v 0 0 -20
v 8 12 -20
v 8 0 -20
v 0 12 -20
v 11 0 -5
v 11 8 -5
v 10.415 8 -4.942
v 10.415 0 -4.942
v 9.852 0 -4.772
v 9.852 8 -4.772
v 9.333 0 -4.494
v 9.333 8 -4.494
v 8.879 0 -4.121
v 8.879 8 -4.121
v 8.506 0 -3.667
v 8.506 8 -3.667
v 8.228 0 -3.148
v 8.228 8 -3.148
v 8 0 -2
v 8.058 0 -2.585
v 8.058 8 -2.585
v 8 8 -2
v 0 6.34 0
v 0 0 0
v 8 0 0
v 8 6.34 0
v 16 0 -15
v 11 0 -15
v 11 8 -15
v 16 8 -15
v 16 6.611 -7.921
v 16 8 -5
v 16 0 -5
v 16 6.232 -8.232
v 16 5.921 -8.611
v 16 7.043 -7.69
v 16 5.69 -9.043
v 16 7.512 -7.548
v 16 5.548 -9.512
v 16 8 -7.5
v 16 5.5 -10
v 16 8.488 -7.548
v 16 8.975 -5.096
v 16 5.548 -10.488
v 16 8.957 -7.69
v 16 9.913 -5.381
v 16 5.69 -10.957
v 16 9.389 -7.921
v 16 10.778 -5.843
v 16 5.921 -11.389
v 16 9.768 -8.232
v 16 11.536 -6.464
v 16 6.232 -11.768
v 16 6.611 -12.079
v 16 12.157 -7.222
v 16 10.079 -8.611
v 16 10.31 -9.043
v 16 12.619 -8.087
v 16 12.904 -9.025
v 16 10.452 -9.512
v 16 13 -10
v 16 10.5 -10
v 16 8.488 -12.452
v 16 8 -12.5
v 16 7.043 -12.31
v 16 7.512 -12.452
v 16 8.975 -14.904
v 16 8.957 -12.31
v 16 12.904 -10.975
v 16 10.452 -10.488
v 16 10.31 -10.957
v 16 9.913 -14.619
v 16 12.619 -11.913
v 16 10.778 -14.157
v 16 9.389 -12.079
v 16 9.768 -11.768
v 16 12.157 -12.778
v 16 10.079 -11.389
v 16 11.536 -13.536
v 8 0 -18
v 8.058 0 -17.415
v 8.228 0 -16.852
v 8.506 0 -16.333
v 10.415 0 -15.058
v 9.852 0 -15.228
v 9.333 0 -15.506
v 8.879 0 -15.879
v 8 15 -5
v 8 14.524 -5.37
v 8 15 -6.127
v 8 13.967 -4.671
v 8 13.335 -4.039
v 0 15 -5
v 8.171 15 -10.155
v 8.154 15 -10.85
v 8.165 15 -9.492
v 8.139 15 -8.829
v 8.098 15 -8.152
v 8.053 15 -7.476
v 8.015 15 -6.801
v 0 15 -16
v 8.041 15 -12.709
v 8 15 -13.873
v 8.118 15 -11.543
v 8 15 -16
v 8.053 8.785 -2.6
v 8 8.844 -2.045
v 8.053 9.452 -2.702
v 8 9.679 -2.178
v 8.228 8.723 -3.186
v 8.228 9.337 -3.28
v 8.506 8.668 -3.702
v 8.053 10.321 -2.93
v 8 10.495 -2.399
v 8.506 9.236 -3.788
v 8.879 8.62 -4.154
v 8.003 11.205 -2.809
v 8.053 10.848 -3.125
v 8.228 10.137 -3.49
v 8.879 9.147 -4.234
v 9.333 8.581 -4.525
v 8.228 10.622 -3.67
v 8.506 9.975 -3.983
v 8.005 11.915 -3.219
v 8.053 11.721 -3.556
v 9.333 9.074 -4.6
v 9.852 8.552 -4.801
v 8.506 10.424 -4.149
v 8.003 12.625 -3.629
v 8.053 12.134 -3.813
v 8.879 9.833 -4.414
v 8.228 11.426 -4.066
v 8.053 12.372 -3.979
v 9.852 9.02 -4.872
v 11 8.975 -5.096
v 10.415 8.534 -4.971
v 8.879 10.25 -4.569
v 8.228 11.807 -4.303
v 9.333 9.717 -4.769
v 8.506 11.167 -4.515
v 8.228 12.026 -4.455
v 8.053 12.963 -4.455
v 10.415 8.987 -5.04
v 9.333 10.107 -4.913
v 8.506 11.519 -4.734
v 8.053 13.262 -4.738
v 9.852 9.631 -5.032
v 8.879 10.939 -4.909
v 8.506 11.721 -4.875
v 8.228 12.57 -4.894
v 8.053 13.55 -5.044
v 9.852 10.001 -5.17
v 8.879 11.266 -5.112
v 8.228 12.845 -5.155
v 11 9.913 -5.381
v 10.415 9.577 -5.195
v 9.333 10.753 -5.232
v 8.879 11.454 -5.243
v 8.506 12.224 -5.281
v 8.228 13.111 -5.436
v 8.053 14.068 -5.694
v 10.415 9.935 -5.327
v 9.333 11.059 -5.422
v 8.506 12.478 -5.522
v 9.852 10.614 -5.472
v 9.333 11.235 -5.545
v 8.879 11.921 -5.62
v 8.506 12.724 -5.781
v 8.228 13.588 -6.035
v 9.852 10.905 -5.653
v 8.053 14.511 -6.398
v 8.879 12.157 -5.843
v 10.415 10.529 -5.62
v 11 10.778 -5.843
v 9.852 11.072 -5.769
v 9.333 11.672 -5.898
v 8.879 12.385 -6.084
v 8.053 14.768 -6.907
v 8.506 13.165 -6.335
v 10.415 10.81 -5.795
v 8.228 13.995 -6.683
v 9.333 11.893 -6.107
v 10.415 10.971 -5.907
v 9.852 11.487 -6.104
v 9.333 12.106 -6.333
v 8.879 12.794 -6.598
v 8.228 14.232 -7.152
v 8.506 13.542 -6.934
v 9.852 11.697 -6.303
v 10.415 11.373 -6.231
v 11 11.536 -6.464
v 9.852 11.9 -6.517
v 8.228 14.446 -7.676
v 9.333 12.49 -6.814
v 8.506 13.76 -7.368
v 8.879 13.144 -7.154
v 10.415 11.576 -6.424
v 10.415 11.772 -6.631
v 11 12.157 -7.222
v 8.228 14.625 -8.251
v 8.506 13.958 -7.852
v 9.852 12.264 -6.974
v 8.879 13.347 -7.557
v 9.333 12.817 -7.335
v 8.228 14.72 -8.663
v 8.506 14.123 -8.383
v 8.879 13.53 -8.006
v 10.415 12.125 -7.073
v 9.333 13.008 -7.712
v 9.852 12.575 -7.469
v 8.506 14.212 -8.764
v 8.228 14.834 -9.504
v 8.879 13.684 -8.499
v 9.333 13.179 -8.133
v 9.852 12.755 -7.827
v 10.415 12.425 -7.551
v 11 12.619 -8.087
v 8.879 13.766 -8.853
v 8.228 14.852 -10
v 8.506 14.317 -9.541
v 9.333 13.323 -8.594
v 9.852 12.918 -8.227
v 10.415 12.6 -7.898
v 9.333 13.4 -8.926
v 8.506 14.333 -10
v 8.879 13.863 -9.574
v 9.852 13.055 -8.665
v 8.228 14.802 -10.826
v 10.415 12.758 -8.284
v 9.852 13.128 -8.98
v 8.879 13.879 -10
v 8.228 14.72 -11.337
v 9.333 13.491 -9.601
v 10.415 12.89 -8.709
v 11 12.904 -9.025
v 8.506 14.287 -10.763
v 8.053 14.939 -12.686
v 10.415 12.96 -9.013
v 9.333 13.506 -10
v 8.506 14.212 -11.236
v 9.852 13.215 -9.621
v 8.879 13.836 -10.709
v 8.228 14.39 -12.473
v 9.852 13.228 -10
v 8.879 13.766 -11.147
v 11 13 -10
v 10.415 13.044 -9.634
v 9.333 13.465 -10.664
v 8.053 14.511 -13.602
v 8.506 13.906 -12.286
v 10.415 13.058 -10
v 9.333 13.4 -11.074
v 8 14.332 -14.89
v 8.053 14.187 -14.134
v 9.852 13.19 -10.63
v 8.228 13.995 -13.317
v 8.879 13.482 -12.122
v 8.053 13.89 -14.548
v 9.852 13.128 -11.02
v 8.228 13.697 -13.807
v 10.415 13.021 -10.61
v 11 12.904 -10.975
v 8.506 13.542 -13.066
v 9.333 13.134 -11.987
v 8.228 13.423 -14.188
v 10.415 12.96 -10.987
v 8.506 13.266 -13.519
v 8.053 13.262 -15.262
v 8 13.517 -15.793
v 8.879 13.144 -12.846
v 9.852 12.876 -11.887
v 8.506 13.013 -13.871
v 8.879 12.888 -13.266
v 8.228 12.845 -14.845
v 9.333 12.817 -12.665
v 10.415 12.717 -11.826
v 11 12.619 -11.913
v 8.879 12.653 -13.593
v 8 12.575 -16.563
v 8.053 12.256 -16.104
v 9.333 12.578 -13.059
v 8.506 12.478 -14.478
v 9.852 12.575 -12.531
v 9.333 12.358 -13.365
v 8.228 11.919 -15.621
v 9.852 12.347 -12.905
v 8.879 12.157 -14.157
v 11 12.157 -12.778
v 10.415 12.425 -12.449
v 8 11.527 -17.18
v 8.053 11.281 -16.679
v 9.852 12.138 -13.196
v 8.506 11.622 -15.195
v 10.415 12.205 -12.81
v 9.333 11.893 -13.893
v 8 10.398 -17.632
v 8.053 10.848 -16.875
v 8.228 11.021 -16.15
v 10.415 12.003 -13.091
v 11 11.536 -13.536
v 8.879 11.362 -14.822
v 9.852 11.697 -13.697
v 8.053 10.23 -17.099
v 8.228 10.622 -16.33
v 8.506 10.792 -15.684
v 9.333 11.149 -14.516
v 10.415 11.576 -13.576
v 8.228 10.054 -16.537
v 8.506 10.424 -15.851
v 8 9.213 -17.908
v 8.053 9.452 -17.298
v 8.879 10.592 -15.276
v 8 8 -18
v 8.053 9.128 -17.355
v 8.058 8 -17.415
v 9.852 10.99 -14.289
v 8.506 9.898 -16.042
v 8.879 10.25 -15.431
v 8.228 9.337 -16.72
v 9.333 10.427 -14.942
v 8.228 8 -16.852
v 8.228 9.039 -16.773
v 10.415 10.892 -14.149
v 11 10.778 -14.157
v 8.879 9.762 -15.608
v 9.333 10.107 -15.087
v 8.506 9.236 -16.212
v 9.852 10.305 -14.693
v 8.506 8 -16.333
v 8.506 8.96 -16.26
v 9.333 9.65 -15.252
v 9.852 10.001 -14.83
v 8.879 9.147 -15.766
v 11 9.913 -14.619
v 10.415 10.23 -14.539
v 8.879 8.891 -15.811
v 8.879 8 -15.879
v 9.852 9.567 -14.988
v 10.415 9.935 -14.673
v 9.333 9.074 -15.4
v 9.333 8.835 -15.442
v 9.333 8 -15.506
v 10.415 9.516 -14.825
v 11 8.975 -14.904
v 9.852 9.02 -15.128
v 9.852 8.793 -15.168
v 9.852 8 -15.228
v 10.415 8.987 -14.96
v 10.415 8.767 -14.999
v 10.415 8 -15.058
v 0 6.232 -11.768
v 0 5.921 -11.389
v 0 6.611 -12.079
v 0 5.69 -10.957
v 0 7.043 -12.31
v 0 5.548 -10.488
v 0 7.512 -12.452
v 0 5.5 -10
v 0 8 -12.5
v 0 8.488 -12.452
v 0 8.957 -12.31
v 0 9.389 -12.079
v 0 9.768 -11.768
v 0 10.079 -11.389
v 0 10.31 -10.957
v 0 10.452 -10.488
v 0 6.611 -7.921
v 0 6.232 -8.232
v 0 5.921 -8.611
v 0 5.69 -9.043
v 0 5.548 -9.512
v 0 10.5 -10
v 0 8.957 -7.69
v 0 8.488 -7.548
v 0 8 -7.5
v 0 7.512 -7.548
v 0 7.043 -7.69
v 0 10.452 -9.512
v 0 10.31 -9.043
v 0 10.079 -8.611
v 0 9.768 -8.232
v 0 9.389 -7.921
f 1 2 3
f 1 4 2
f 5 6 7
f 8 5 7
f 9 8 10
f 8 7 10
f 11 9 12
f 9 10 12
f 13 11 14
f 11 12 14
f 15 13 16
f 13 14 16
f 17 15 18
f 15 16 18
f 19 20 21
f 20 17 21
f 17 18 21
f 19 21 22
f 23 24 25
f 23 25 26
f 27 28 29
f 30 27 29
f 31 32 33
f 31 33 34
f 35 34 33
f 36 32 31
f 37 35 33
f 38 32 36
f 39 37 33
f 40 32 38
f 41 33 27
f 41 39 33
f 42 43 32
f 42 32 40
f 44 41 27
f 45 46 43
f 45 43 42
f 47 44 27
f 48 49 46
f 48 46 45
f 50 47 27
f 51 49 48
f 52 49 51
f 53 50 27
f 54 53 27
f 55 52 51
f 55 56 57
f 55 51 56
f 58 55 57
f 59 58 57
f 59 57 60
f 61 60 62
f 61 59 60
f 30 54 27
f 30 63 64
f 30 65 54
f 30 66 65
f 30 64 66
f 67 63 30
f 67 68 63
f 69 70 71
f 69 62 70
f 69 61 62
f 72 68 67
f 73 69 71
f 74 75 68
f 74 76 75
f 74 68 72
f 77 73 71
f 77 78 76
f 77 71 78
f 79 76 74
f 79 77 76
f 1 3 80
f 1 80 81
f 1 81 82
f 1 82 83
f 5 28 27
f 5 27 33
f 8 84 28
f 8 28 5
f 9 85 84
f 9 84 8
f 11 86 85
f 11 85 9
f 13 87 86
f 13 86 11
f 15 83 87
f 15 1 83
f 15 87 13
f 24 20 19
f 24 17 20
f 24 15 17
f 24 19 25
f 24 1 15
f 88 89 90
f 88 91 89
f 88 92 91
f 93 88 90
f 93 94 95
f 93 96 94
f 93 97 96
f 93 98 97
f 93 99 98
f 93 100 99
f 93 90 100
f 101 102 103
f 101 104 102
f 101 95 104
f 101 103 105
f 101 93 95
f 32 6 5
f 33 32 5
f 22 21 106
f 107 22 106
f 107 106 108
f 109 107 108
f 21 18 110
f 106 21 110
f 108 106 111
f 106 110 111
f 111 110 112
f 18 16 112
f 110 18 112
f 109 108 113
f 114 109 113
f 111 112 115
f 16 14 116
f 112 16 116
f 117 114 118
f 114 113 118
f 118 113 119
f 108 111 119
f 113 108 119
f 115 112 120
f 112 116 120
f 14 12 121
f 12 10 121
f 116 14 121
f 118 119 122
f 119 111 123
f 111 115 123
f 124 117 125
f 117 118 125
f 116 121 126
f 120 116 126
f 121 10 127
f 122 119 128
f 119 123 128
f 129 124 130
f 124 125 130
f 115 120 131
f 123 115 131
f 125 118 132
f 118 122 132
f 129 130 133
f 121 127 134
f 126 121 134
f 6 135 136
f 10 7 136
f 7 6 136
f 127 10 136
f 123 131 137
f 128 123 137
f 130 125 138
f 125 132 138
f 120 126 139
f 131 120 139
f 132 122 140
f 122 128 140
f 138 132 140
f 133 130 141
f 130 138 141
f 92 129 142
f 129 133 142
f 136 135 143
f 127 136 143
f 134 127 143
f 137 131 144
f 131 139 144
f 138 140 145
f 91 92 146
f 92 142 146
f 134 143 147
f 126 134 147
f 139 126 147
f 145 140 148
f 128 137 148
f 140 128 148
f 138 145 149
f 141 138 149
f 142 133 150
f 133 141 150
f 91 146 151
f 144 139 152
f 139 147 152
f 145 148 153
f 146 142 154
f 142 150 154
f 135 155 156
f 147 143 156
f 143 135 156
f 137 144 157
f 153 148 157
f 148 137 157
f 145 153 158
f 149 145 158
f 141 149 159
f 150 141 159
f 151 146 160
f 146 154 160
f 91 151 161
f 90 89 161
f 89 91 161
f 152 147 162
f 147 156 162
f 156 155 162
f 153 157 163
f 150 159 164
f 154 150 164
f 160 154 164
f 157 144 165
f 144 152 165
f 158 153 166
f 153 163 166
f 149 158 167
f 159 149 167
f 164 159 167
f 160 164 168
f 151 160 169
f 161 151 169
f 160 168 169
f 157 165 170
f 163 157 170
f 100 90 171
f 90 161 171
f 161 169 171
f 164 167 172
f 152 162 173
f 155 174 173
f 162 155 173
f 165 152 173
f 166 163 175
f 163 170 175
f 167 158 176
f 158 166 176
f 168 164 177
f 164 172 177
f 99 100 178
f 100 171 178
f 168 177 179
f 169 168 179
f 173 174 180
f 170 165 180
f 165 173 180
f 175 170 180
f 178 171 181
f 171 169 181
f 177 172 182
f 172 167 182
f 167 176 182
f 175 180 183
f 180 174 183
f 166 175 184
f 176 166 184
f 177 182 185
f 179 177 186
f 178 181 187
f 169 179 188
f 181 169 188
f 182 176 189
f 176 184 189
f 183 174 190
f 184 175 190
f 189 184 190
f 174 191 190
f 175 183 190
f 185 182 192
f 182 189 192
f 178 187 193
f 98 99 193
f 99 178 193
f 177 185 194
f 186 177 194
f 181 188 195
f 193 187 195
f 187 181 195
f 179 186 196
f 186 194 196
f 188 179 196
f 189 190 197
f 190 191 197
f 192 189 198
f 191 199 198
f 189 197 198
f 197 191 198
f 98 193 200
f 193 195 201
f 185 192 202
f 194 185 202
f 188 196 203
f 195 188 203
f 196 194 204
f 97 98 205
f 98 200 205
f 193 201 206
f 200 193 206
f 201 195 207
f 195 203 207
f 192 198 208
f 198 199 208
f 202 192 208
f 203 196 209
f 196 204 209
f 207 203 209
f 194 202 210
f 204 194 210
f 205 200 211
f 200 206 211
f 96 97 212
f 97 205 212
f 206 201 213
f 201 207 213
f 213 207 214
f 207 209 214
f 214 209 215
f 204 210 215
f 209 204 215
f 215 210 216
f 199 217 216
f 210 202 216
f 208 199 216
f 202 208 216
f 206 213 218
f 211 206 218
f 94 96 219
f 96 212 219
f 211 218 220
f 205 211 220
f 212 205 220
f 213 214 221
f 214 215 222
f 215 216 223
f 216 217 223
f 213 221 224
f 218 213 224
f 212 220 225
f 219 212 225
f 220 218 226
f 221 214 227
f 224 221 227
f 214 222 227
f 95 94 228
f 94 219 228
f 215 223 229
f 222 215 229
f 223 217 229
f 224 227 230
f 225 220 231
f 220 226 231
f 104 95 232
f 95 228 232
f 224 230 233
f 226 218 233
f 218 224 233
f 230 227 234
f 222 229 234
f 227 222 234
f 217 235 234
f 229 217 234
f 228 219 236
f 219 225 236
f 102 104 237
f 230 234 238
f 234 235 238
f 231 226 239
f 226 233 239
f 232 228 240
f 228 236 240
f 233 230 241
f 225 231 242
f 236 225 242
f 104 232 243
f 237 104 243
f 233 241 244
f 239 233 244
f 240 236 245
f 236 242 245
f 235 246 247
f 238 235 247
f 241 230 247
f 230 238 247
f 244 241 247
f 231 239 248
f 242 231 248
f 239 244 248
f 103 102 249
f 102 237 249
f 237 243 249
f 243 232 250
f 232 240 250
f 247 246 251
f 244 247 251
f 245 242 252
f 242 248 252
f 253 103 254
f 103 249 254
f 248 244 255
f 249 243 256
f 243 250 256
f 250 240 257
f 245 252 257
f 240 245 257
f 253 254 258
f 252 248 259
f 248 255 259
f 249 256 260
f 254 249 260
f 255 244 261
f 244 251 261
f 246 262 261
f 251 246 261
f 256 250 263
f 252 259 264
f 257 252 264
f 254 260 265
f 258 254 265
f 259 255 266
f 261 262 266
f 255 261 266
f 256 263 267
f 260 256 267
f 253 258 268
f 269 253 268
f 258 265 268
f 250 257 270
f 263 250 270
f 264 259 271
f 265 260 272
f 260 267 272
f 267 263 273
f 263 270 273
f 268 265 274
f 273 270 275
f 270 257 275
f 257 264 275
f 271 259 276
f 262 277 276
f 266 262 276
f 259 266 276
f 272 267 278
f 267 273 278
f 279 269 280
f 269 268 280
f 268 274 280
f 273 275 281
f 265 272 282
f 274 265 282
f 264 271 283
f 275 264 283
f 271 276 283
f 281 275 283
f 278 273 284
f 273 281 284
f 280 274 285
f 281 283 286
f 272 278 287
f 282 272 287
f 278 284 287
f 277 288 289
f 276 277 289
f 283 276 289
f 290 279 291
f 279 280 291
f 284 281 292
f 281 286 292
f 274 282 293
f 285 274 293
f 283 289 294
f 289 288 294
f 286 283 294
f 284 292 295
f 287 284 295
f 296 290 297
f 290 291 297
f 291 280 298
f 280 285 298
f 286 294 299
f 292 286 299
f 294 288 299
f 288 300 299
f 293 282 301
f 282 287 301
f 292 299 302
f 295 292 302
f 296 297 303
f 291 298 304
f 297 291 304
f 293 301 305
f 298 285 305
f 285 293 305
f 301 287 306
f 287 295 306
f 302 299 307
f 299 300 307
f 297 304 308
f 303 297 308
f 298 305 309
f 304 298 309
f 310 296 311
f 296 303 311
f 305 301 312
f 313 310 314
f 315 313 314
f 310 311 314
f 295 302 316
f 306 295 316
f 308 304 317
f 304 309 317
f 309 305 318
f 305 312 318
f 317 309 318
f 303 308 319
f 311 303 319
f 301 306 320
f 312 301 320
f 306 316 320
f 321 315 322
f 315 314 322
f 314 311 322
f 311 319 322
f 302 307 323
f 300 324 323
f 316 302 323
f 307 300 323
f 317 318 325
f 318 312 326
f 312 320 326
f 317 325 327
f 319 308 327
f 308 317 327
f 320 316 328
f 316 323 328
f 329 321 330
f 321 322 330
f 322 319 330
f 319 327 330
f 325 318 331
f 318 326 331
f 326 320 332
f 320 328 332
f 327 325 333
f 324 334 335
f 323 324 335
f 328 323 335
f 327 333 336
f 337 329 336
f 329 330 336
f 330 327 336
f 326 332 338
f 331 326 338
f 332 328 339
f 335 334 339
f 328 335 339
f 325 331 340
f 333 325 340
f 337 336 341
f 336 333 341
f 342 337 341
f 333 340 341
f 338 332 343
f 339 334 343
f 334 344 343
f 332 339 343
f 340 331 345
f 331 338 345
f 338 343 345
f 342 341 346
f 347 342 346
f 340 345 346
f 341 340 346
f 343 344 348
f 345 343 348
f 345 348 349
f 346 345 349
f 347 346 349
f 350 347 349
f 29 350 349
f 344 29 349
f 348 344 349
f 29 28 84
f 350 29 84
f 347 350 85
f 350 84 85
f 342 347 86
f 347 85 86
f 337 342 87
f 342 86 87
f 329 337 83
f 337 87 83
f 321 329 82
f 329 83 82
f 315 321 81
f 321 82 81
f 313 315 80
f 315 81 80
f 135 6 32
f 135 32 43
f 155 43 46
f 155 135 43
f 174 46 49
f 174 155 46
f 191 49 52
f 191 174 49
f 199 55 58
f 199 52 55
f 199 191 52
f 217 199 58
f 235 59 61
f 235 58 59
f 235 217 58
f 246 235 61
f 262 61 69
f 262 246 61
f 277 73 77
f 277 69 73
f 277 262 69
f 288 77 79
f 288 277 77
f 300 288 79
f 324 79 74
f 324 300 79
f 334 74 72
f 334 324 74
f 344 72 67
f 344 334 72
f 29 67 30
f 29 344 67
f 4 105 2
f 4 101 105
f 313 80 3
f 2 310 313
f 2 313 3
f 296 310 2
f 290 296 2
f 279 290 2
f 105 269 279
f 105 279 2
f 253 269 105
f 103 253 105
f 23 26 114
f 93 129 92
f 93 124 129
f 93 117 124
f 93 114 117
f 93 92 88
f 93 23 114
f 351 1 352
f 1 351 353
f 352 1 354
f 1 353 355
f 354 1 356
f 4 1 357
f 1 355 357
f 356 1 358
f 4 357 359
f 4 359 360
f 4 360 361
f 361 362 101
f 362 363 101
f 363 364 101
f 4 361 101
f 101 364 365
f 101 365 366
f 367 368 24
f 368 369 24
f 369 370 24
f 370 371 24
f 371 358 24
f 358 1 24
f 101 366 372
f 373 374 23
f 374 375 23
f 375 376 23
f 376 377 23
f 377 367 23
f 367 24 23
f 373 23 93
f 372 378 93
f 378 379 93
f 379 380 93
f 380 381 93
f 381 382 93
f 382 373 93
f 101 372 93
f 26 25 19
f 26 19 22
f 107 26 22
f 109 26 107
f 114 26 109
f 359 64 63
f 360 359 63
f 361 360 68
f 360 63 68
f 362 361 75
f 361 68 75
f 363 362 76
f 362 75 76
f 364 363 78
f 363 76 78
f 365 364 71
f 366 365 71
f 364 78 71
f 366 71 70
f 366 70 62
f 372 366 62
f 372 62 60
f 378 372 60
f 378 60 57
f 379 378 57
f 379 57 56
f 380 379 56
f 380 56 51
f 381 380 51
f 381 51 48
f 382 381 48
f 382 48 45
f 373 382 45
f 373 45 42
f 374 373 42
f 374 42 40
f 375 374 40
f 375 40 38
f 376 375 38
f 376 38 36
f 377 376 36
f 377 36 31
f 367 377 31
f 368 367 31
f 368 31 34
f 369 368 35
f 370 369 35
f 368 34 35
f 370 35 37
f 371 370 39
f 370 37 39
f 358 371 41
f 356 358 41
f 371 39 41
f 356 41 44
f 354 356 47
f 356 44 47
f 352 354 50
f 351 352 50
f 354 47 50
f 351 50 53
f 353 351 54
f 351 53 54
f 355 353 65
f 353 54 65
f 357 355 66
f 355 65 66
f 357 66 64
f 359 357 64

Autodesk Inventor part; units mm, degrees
ref_plane "YZ Plane" through (0, 0, 0) normal (1, 0, 0) x (0, 1, 0)
ref_plane "XZ Plane" through (0, 0, 0) normal (0, 1, 0) x (-1, 0, 0)
ref_plane "XY Plane" through (0, 0, 0) normal (0, 0, 1) x (1, 0, 0)
sketch "草圖1" plane through (0, 0, 0) normal (1, 0, 0) x (0, 1, 0)
  line L0 (0, 0) -> (6.3397, 0)
  line L1 (6.3397, 0) -> (15, -5)
  line L2 (15, -5) -> (15, -16)
  line L3 (15, -16) -> (12, -20)
  line L4 (12, -20) -> (0, -20)
  line L5 (0, -20) -> (0, 0)
  dimension "d0" = 15
  dimension "d1" = 20
  dimension "d2" = 60
  dimension "d3" = 5
  dimension "d4" = 4
  dimension "d5" = 3
extrude "擠出1" add sketch "草圖1" along normal blind 8
sketch "草圖2" plane through (8, 0, 0) normal (1, 0, 0) x (0, 0, -1)
  line L0 (0, 0) -> (20, 0) projected
  line L1 (15, 0) -> (15, 8)
  arc A0 (15, 8) -> (5, 8) centre (10, 8) ccw
  line L2 (5, 8) -> (5, 0)
  line L3 (5, 8) -> (16.8472, 8) construction
  line L4 (10, 8) -> (10, 12.4145) construction
  line L5 (0, 6.3397) -> (0, 0) projected
  line L6 (5, 0) -> (15, 0)
  dimension "d8" = 10
  dimension "d9" = 5
  dimension "d10" = 8
extrude "擠出2" add sketch "草圖2" along normal blind 8
fillet "圓角1" radius 3 3 edges at (8, 13, -10) (8, 4, -15) (8, 4, -5)
sketch "草圖3" plane through (16, 0, 0) normal (1, 0, 0) x (0, 0, -1)
  arc A0 (15, 8) -> (5, 8) centre (10, 8) ccw projected
  circle A1 centre (10, 8) radius 2.5
  point P0 (0, 0)
  dimension "d14" = 5
extrude "擠出3" cut sketch "草圖3" against normal up to next
properties part number "410571040示範二"
